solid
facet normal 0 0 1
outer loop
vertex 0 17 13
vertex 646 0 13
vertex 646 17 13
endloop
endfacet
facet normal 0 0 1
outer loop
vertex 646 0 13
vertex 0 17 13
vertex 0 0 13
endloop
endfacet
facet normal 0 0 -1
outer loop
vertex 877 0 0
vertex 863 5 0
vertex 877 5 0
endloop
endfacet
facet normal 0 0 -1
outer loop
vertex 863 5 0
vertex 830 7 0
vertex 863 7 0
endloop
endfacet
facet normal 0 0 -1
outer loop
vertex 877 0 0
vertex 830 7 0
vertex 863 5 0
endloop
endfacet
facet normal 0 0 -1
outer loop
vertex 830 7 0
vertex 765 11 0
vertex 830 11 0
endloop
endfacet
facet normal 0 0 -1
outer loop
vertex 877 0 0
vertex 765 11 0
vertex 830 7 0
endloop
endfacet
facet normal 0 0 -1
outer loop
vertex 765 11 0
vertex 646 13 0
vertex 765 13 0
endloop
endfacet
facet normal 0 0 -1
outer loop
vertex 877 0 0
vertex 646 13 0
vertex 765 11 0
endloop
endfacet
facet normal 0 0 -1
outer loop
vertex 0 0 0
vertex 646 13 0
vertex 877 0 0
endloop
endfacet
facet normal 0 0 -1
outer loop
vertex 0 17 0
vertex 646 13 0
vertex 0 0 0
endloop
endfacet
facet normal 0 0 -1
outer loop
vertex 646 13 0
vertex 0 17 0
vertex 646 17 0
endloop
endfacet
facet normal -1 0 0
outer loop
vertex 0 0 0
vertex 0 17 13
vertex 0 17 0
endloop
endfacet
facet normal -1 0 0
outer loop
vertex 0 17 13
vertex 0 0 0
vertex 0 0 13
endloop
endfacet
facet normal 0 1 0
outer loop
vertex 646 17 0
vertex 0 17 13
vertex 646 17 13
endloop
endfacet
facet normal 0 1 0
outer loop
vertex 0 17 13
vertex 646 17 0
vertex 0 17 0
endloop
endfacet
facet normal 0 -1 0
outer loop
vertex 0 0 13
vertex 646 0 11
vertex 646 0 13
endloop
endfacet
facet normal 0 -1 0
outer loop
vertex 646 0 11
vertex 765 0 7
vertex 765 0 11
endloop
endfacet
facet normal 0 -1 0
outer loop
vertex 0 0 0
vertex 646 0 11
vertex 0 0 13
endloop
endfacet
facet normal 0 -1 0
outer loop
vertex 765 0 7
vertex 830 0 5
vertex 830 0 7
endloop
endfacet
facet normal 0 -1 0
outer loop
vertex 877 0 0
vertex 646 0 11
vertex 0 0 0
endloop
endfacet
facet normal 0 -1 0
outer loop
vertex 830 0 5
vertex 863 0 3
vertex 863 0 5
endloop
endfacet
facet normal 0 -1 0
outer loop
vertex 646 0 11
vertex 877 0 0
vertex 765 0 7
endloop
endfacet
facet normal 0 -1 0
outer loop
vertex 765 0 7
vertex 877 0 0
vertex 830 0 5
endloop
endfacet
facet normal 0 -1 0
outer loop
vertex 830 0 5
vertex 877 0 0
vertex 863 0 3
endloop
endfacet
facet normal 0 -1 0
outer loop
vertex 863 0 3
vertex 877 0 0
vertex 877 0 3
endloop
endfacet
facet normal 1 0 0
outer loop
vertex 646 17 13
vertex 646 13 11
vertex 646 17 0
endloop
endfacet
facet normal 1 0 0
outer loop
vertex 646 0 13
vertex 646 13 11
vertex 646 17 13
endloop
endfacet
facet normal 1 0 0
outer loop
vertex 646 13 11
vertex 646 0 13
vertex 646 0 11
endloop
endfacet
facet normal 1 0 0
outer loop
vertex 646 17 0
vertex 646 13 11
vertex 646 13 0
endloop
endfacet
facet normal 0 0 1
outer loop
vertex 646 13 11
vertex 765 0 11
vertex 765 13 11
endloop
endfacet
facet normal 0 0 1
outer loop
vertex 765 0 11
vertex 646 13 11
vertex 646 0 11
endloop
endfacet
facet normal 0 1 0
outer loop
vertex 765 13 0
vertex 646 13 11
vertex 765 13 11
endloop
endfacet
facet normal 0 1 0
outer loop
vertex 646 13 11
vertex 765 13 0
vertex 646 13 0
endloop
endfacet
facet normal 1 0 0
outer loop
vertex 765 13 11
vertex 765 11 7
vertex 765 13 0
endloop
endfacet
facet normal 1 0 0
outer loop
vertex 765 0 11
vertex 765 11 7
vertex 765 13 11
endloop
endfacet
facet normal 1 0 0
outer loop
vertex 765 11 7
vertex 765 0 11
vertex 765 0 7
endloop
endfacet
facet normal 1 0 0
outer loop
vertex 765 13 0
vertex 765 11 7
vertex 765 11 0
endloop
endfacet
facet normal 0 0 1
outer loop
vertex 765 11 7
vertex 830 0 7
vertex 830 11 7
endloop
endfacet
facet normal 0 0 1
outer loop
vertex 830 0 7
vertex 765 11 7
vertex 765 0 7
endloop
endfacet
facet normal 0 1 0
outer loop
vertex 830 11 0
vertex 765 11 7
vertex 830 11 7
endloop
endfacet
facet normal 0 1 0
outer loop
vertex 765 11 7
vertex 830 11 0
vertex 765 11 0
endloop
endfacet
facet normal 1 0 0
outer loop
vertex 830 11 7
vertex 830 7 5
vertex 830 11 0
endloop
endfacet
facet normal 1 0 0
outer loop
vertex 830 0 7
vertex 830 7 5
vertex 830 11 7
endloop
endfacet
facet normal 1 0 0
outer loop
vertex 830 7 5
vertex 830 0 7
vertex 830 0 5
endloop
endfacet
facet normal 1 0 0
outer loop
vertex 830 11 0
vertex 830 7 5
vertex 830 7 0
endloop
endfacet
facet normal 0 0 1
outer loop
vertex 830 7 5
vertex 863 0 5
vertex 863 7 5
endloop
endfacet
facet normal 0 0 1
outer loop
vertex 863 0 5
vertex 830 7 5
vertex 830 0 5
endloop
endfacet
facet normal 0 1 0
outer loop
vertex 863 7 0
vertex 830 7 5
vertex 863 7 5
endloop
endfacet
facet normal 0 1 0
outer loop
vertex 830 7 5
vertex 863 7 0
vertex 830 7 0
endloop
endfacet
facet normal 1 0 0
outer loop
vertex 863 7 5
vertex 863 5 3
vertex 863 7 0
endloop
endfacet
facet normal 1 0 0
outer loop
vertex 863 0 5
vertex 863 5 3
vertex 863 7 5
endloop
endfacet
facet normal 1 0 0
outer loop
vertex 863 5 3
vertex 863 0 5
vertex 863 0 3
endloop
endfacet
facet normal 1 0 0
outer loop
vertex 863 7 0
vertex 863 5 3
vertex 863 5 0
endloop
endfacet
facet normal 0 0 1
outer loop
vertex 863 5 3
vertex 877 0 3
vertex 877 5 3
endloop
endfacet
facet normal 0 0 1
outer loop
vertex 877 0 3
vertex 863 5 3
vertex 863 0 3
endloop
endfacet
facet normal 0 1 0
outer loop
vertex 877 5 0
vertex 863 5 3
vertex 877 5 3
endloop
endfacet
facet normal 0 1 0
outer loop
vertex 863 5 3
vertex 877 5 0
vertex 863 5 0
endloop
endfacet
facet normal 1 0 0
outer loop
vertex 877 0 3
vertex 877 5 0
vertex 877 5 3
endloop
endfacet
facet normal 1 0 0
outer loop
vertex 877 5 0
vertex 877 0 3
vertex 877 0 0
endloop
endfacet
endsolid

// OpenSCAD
translate([9.5, 8.5, 6.5]) color([0.600448770579328, 0.7944487907838055, 0.1681613799771936]) cube([19, 17, 13], center=true);
translate([28.5, 8.5, 6.5]) color([0.9183995562433641, 0.9268586566852167, 0.40822611044352053]) cube([19, 17, 13], center=true);
translate([47.5, 8.5, 6.5]) color([0.4407066729290805, 0.6041418306666712, 0.6201352905963935]) cube([19, 17, 13], center=true);
translate([66.5, 8.5, 6.5]) color([0.25582819932935885, 0.3097428572381714, 0.8490920052212889]) cube([19, 17, 13], center=true);
translate([85.5, 8.5, 6.5]) color([0.453637908490201, 0.18066627555108494, 0.4537290543496928]) cube([19, 17, 13], center=true);
translate([104.5, 8.5, 6.5]) color([0.2641493990309046, 0.9492851375614021, 0.06409274308092405]) cube([19, 17, 13], center=true);
translate([123.5, 8.5, 6.5]) color([0.09630522223834415, 0.02618666999626429, 0.02133712304448243]) cube([19, 17, 13], center=true);
translate([142.5, 8.5, 6.5]) color([0.40376331371079255, 0.6905719463038024, 0.8969992176715027]) cube([19, 17, 13], center=true);
translate([161.5, 8.5, 6.5]) color([0.32280326974746465, 0.790755737975632, 0.7460115169857665]) cube([19, 17, 13], center=true);
translate([180.5, 8.5, 6.5]) color([0.6948475129606672, 0.47653257906772517, 0.8579766307154586]) cube([19, 17, 13], center=true);
translate([199.5, 8.5, 6.5]) color([0.5356136848189613, 0.4019331618452773, 0.783713898498177]) cube([19, 17, 13], center=true);
translate([218.5, 8.5, 6.5]) color([0.9254696984756191, 0.0277966234683793, 0.5158650286176655]) cube([19, 17, 13], center=true);
translate([237.5, 8.5, 6.5]) color([0.8365998776746773, 0.08009244005093674, 0.35854963179787425]) cube([19, 17, 13], center=true);
translate([256.5, 8.5, 6.5]) color([0.0984859129144442, 0.9681463616569913, 0.1542718478221884]) cube([19, 17, 13], center=true);
translate([275.5, 8.5, 6.5]) color([0.5165971564168642, 0.8047430089643692, 0.9598305824160865]) cube([19, 17, 13], center=true);
translate([294.5, 8.5, 6.5]) color([0.0007265089205383823, 0.33769105491683293, 0.9444140087685011]) cube([19, 17, 13], center=true);
translate([313.5, 8.5, 6.5]) color([0.6959768172121321, 0.16055826227824588, 0.7793255516951493]) cube([19, 17, 13], center=true);
translate([332.5, 8.5, 6.5]) color([0.1589752259859445, 0.6798370424105331, 0.9431536263145228]) cube([19, 17, 13], center=true);
translate([351.5, 8.5, 6.5]) color([0.9341404857092784, 0.32827049453258017, 0.023848105094706917]) cube([19, 17, 13], center=true);
translate([370.5, 8.5, 6.5]) color([0.9585798448912861, 0.6258377632382796, 0.3981042954636257]) cube([19, 17, 13], center=true);
translate([389.5, 8.5, 6.5]) color([0.2264255750200933, 0.6356717667101055, 0.328569085672622]) cube([19, 17, 13], center=true);
translate([408.5, 8.5, 6.5]) color([0.9662245753272395, 0.3520821722301851, 0.16362135021644642]) cube([19, 17, 13], center=true);
translate([427.5, 8.5, 6.5]) color([0.42074777530803376, 0.36328644213461747, 0.5653807754665455]) cube([19, 17, 13], center=true);
translate([442.5, 8.5, 6.5]) color([0.3865100485452896, 0.7707594112565195, 0.16214085318372695]) cube([11, 17, 13], center=true);
translate([453.5, 8.5, 6.5]) color([0.5836514905515098, 0.6869400768720183, 0.718467099976435]) cube([11, 17, 13], center=true);
translate([464.5, 8.5, 6.5]) color([0.17196229100139104, 0.14887881293527583, 0.025166107893626943]) cube([11, 17, 13], center=true);
translate([475.5, 8.5, 6.5]) color([0.32332346968418324, 0.003696799562737496, 0.04720529747843194]) cube([11, 17, 13], center=true);
translate([486.5, 8.5, 6.5]) color([0.9255571895234466, 0.573001262631075, 0.14769469781462263]) cube([11, 17, 13], center=true);
translate([497.5, 8.5, 6.5]) color([0.15315209085934545, 0.7868491215994531, 0.7877029182496789]) cube([11, 17, 13], center=true);
translate([508.5, 8.5, 6.5]) color([0.4187372508366701, 0.5680438273675328, 0.6864311496386182]) cube([11, 17, 13], center=true);
translate([519.5, 8.5, 6.5]) color([0.7112052310106062, 0.9225367392437966, 0.36402675889620517]) cube([11, 17, 13], center=true);
translate([530.5, 8.5, 6.5]) color([0.21666285047939615, 0.40038769746607716, 0.12979762559949215]) cube([11, 17, 13], center=true);
translate([541.5, 8.5, 6.5]) color([0.5661089096865166, 0.350592866287013, 0.09655676358596321]) cube([11, 17, 13], center=true);
translate([552.5, 8.5, 6.5]) color([0.8957043173613797, 0.24564542972396286, 0.3817592950540295]) cube([11, 17, 13], center=true);
translate([563.5, 8.5, 6.5]) color([0.9163373365613642, 0.24005472395766314, 0.4811830401201487]) cube([11, 17, 13], center=true);
translate([574.5, 8.5, 6.5]) color([0.9204180358452778, 0.06901768472479497, 0.25236871091997304]) cube([11, 17, 13], center=true);
translate([585.5, 8.5, 6.5]) color([0.2758752397078251, 0.526585946767007, 0.5423400552699501]) cube([11, 17, 13], center=true);
translate([596.5, 8.5, 6.5]) color([0.6040332809955223, 0.7795947303962014, 0.8767515811101877]) cube([11, 17, 13], center=true);
translate([607.5, 8.5, 6.5]) color([0.27628184885013174, 0.6109665581700968, 0.8673330381368943]) cube([11, 17, 13], center=true);
translate([618.5, 8.5, 6.5]) color([0.39077563557117434, 0.6261021875341246, 0.5344719952169016]) cube([11, 17, 13], center=true);
translate([629.5, 8.5, 6.5]) color([0.8525626141482417, 0.1442072370162294, 0.39242938925918713]) cube([11, 17, 13], center=true);
translate([640.5, 8.5, 6.5]) color([0.7677442686337953, 0.7310024639236243, 0.976490023680837]) cube([11, 17, 13], center=true);
translate([649.5, 6.5, 5.5]) color([0.432956620488795, 0.10481875176128097, 0.4606863677813431]) cube([7, 13, 11], center=true);
translate([656.5, 6.5, 5.5]) color([0.461987586031698, 0.16960878923904732, 0.4743590683571708]) cube([7, 13, 11], center=true);
translate([663.5, 6.5, 5.5]) color([0.15900931947085895, 0.9184122383299332, 0.8645912802495788]) cube([7, 13, 11], center=true);
translate([670.5, 6.5, 5.5]) color([0.7618309073415613, 0.1125156501937501, 0.36828247715101237]) cube([7, 13, 11], center=true);
translate([677.5, 6.5, 5.5]) color([0.14269334546182144, 0.3576212954978014, 0.47267833076618404]) cube([7, 13, 11], center=true);
translate([684.5, 6.5, 5.5]) color([0.5187172796832821, 0.05390524264941354, 0.8771386739413267]) cube([7, 13, 11], center=true);
translate([691.5, 6.5, 5.5]) color([0.25763233882857706, 0.7234564765071956, 0.3246711887124375]) cube([7, 13, 11], center=true);
translate([698.5, 6.5, 5.5]) color([0.3801134723009394, 0.04146251299314507, 0.5514350789130729]) cube([7, 13, 11], center=true);
translate([705.5, 6.5, 5.5]) color([0.03490092368589748, 0.4105469306488987, 0.3751623833766272]) cube([7, 13, 11], center=true);
translate([712.5, 6.5, 5.5]) color([0.20817480494735885, 0.13416269520041413, 0.11029894361740877]) cube([7, 13, 11], center=true);
translate([719.5, 6.5, 5.5]) color([0.3569637027811857, 0.03122581862343432, 0.5766961902260587]) cube([7, 13, 11], center=true);
translate([726.5, 6.5, 5.5]) color([0.46351932045943167, 0.6418946885374921, 0.7070356211127606]) cube([7, 13, 11], center=true);
translate([733.5, 6.5, 5.5]) color([0.07782501561786981, 0.42542790282452947, 0.7262099352025745]) cube([7, 13, 11], center=true);
translate([740.5, 6.5, 5.5]) color([0.1383007479401901, 0.15296819960671582, 0.16447153857536234]) cube([7, 13, 11], center=true);
translate([747.5, 6.5, 5.5]) color([0.02972250823157674, 0.13555611535148748, 0.49304209170471214]) cube([7, 13, 11], center=true);
translate([754.5, 6.5, 5.5]) color([0.8998582652350663, 0.6233506257524957, 0.28803948846792526]) cube([7, 13, 11], center=true);
translate([761.5, 6.5, 5.5]) color([0.7932252536354372, 0.6841926136499455, 0.8025617596714979]) cube([7, 13, 11], center=true);
translate([767.5, 5.5, 3.5]) color([0.9141286153689818, 0.8380916000073253, 0.7734206085146829]) cube([5, 11, 7], center=true);
translate([772.5, 5.5, 3.5]) color([0.26176851167691584, 0.15831969188506612, 0.6279762350139132]) cube([5, 11, 7], center=true);
translate([777.5, 5.5, 3.5]) color([0.968532274155243, 0.5331314108905011, 0.14458049768334114]) cube([5, 11, 7], center=true);
translate([782.5, 5.5, 3.5]) color([0.3761389701406963, 0.7397992144806613, 0.5554788507911738]) cube([5, 11, 7], center=true);
translate([787.5, 5.5, 3.5]) color([0.2345364606417215, 0.9148239194796951, 0.37856658806298793]) cube([5, 11, 7], center=true);
translate([792.5, 5.5, 3.5]) color([0.39026506951982043, 0.4712732695903361, 0.3061585200178283]) cube([5, 11, 7], center=true);
translate([797.5, 5.5, 3.5]) color([0.41010119017851343, 0.4062986061941243, 0.09771277519641097]) cube([5, 11, 7], center=true);
translate([802.5, 5.5, 3.5]) color([0.9732189413459187, 0.1476462111243403, 0.5834920525213394]) cube([5, 11, 7], center=true);
translate([807.5, 5.5, 3.5]) color([0.6340513654385499, 0.981030210372344, 0.8814881035470955]) cube([5, 11, 7], center=true);
translate([812.5, 5.5, 3.5]) color([0.10681393516694448, 0.7792822990369496, 0.6980706766614326]) cube([5, 11, 7], center=true);
translate([817.5, 5.5, 3.5]) color([0.5957858833990998, 0.6031315697857828, 0.513452068799622]) cube([5, 11, 7], center=true);
translate([822.5, 5.5, 3.5]) color([0.26667928463625334, 0.7319196359388911, 0.16863726359497544]) cube([5, 11, 7], center=true);
translate([827.5, 5.5, 3.5]) color([0.08537701363375594, 0.03602107622091366, 0.11539851048895433]) cube([5, 11, 7], center=true);
translate([831.5, 3.5, 2.5]) color([0.362166522572666, 0.7224633804016175, 0.31835367611154275]) cube([3, 7, 5], center=true);
translate([834.5, 3.5, 2.5]) color([0.6759746033894163, 0.3690945326108701, 0.6966804657420774]) cube([3, 7, 5], center=true);
translate([837.5, 3.5, 2.5]) color([0.6665423027167577, 0.8120877428034601, 0.22871566506275376]) cube([3, 7, 5], center=true);
translate([840.5, 3.5, 2.5]) color([0.1590470788005368, 0.551630898022963, 0.8946771329487354]) cube([3, 7, 5], center=true);
translate([843.5, 3.5, 2.5]) color([0.7805199910429719, 0.5079920956553113, 0.8859418345093829]) cube([3, 7, 5], center=true);
translate([846.5, 3.5, 2.5]) color([0.025781518425698202, 0.6432115126368863, 0.16681516080095515]) cube([3, 7, 5], center=true);
translate([849.5, 3.5, 2.5]) color([0.9937350713993572, 0.40890136814306854, 0.6606487125760558]) cube([3, 7, 5], center=true);
translate([852.5, 3.5, 2.5]) color([0.4381854363391663, 0.6836690634862878, 0.2641275750187716]) cube([3, 7, 5], center=true);
translate([855.5, 3.5, 2.5]) color([0.5874382639994257, 0.9196592523769888, 0.17133498851343842]) cube([3, 7, 5], center=true);
translate([858.5, 3.5, 2.5]) color([0.44096269879447136, 0.05365288940263557, 0.37504810787352794]) cube([3, 7, 5], center=true);
translate([861.5, 3.5, 2.5]) color([0.8023437119036539, 0.6440571739391641, 0.405188264955044]) cube([3, 7, 5], center=true);
translate([864.0, 2.5, 1.5]) color([0.23309555282291106, 0.8734163899386287, 0.03910603731828377]) cube([2, 5, 3], center=true);
translate([866.0, 2.5, 1.5]) color([0.6200029336050585, 0.26869184399515444, 0.5075002274683115]) cube([2, 5, 3], center=true);
translate([868.0, 2.5, 1.5]) color([0.5507921997084286, 0.3940908199003246, 0.26530695096417045]) cube([2, 5, 3], center=true);
translate([870.0, 2.5, 1.5]) color([0.22977064207941722, 0.36432219415560163, 0.30245362112059626]) cube([2, 5, 3], center=true);
translate([872.0, 2.5, 1.5]) color([0.608858680960566, 0.9168055515262393, 0.4569209446671899]) cube([2, 5, 3], center=true);
translate([874.0, 2.5, 1.5]) color([0.9624175881482058, 0.4781119033190907, 0.5661202665644991]) cube([2, 5, 3], center=true);
translate([876.0, 2.5, 1.5]) color([0.4099824022959203, 0.09224140841906192, 0.48229193113482605]) cube([2, 5, 3], center=true);
